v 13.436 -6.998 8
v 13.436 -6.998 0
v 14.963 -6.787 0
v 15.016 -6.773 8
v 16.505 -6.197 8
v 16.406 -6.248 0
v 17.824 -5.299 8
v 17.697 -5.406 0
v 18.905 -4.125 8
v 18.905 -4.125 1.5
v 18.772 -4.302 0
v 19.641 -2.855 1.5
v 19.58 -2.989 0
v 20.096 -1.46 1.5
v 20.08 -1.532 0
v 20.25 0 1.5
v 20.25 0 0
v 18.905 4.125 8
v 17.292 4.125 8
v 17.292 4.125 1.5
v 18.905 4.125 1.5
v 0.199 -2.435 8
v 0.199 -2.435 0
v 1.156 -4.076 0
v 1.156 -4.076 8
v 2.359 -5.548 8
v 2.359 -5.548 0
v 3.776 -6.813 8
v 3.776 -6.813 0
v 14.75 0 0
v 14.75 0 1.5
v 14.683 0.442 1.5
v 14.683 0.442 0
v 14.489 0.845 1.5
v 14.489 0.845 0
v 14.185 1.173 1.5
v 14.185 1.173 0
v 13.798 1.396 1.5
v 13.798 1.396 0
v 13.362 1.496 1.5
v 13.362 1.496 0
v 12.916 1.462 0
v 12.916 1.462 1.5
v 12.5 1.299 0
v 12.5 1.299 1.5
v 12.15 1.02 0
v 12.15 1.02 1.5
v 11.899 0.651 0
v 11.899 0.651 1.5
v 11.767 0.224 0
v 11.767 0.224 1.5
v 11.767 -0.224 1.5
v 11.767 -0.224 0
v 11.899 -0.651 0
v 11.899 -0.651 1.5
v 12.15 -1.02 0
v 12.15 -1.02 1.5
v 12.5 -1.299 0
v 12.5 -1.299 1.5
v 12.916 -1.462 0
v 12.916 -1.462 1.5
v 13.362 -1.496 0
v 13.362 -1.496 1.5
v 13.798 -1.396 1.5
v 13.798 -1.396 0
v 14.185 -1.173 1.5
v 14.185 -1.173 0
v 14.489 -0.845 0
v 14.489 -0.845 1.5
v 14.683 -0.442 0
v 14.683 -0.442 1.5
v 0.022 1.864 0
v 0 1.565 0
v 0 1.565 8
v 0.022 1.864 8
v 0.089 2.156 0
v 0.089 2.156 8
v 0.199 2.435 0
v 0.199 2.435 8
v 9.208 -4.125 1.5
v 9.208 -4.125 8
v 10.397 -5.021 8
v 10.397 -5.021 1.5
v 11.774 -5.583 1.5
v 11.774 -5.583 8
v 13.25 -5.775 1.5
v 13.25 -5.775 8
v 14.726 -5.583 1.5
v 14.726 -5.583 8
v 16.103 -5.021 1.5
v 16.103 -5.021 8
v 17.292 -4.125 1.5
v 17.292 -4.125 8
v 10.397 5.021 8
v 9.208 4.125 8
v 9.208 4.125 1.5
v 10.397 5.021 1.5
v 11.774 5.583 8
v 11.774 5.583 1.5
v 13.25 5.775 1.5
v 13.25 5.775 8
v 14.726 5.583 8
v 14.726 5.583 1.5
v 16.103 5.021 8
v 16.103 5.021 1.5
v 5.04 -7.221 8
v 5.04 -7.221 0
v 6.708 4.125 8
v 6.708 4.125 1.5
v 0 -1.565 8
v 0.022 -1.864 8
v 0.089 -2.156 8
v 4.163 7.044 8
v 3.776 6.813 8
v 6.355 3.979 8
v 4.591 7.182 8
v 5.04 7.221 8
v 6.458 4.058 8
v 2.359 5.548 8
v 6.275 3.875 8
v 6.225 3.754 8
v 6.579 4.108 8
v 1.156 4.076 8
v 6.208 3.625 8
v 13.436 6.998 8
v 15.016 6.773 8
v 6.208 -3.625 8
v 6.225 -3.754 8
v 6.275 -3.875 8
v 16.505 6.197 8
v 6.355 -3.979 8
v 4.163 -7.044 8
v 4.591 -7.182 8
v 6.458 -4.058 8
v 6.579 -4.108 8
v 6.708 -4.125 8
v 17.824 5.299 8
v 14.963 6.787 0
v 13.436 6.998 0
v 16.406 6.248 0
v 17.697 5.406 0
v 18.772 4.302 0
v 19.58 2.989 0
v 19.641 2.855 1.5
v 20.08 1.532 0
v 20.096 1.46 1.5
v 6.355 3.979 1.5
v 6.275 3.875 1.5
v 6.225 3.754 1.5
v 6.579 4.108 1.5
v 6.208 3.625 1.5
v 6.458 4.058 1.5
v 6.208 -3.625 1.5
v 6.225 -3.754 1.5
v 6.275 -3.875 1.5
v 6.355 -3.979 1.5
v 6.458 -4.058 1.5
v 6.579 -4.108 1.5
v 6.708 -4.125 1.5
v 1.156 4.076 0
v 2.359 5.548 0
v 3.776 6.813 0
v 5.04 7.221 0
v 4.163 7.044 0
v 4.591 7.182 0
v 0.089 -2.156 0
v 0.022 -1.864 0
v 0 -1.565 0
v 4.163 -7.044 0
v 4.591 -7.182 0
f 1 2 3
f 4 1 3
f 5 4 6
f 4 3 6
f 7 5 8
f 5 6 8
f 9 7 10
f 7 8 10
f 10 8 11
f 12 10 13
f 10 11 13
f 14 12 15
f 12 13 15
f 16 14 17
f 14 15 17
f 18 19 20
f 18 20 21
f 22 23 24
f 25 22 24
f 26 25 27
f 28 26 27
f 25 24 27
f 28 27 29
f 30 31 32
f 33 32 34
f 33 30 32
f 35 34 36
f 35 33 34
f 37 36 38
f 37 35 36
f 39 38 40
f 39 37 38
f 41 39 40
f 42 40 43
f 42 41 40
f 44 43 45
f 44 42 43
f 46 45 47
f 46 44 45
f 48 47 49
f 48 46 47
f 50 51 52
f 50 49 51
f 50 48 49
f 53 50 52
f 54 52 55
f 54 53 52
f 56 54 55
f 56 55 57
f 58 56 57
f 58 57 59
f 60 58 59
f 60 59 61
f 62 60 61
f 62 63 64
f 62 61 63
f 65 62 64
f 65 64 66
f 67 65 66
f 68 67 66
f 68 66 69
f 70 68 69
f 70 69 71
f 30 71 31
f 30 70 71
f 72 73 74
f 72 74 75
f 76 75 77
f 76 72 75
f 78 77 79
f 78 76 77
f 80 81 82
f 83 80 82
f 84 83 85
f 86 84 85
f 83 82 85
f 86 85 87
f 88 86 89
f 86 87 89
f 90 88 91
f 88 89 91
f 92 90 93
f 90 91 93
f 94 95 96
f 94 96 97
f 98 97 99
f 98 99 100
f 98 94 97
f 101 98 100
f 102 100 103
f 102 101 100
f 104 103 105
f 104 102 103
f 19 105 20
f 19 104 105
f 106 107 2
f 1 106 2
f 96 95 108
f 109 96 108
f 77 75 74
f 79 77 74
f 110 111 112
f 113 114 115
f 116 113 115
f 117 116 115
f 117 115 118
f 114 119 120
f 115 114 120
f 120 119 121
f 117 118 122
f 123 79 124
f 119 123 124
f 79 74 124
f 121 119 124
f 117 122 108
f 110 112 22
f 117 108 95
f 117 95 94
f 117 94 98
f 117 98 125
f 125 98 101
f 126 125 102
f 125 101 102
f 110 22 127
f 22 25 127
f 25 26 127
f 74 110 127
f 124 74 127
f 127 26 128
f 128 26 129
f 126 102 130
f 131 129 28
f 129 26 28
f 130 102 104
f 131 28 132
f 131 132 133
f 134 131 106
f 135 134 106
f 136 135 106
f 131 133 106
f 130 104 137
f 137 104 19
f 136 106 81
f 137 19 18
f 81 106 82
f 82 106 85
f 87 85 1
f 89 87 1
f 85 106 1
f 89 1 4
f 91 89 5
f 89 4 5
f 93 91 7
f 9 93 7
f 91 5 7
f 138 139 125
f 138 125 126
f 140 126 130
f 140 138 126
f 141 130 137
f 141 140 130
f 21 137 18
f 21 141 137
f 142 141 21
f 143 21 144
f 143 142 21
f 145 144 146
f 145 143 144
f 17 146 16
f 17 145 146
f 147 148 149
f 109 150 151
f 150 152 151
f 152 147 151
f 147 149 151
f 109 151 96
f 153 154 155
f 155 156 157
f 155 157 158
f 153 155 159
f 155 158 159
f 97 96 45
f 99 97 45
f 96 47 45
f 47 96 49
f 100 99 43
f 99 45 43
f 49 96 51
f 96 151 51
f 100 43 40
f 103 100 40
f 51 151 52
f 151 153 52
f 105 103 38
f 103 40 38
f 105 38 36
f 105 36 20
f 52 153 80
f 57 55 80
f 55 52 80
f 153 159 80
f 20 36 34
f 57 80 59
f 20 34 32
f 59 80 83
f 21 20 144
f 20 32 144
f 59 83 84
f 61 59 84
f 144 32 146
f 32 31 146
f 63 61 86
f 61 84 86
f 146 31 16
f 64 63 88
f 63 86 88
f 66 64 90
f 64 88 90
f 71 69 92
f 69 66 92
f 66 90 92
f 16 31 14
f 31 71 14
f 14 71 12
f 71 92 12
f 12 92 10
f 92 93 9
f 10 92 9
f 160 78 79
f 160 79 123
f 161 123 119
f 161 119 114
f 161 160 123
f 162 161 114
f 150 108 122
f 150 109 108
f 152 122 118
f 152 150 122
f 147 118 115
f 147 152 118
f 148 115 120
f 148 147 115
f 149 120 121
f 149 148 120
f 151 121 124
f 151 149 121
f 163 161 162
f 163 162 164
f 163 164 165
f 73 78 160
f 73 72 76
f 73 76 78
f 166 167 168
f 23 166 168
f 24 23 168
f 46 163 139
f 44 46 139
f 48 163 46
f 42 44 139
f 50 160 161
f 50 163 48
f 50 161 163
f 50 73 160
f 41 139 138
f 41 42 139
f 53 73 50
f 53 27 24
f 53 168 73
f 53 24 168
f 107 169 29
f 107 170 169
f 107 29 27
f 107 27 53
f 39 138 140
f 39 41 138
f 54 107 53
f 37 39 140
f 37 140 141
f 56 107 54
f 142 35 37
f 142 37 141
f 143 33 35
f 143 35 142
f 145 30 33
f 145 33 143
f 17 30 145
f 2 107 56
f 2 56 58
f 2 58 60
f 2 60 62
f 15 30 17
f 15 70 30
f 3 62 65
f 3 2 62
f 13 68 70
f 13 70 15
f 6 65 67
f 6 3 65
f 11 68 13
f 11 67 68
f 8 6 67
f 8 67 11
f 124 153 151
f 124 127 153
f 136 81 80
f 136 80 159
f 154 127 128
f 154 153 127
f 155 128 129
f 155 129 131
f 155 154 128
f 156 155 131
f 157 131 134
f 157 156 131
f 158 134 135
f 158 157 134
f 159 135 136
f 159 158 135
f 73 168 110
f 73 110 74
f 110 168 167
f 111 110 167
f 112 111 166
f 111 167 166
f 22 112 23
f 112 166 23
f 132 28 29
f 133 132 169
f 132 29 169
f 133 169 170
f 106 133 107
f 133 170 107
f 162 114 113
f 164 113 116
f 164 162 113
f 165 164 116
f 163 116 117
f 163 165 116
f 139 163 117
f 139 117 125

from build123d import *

# Parameters (mm, degrees)
PAD_DEPTH       = 8
POCKET_DEPTH    = 6.5
SKETCH_R        = 1.5
POCKET001_DEPTH = 8.001
FILLET_R        = 0.5


with BuildPart() as part:
    # Sketch004 (on XY_Plane of Origin) → Pad (new body)
    with BuildSketch(Plane.XY):
        with BuildLine():
            ThreePointArc((0.198755, -2.434603), (1.728484, -4.835416), (3.775997, -6.813208))
            ThreePointArc((3.775997, -6.813208), (4.37324, -7.125), (5.040127, -7.220785))
            Line((5.040127, -7.220785), (13.436073, -6.997526))
            ThreePointArc((13.436073, -6.997526), (18.265103, -4.883518), (20.25, 0))
            Line((0, 0), (20.25, 0))
            Line((0, 0), (0, -1.565397))
            ThreePointArc((0, -1.565397), (0.050322, -2.011217), (0.198755, -2.434603))
        make_face()
    pad = extrude(amount=PAD_DEPTH)

    # Mirrored: Pad across Sketch004 H_Axis
    add(pad.mirror(Plane.ZX))

    # Sketch005 (on Face5 of Mirrored) → Pocket (cut)
    with BuildSketch(Plane.XY.offset(8)):
        with BuildLine():
            Line((17.291658, -4.125), (20.291658, -4.125))
            Line((20.291658, -4.125), (20.291658, 0))
            Line((20.291658, 0), (6.208342, 0))
            Line((6.208342, -4.125), (6.208342, 0))
            Line((9.208342, -4.125), (6.208342, -4.125))
            ThreePointArc((9.208342, -4.125), (13.25, -5.775), (17.291658, -4.125))
        make_face()
    pocket = extrude(amount=-POCKET_DEPTH, mode=Mode.SUBTRACT)

    # Mirrored001: Pocket across Sketch005 H_Axis
    add(pocket.mirror(Plane(origin=(0, 0, 8), x_dir=(0, 0, 1), z_dir=(0, 1, 0))), mode=Mode.SUBTRACT)

    # Sketch (on XY_Plane of Origin) → Pocket001 (cut, through all)
    with BuildSketch(Plane.XY):
        with Locations((13.25, 0)):
            Circle(SKETCH_R)
    extrude(amount=POCKET001_DEPTH, mode=Mode.SUBTRACT)

    # Fillet
    fillet_edges = [part.edges().sort_by_distance(p)[0] for p in [
        (6.208342, 4.125, 4.75),
        (6.208342, -4.125, 4.75),
    ]]
    fillet(fillet_edges, radius=FILLET_R)


solid = part.part
